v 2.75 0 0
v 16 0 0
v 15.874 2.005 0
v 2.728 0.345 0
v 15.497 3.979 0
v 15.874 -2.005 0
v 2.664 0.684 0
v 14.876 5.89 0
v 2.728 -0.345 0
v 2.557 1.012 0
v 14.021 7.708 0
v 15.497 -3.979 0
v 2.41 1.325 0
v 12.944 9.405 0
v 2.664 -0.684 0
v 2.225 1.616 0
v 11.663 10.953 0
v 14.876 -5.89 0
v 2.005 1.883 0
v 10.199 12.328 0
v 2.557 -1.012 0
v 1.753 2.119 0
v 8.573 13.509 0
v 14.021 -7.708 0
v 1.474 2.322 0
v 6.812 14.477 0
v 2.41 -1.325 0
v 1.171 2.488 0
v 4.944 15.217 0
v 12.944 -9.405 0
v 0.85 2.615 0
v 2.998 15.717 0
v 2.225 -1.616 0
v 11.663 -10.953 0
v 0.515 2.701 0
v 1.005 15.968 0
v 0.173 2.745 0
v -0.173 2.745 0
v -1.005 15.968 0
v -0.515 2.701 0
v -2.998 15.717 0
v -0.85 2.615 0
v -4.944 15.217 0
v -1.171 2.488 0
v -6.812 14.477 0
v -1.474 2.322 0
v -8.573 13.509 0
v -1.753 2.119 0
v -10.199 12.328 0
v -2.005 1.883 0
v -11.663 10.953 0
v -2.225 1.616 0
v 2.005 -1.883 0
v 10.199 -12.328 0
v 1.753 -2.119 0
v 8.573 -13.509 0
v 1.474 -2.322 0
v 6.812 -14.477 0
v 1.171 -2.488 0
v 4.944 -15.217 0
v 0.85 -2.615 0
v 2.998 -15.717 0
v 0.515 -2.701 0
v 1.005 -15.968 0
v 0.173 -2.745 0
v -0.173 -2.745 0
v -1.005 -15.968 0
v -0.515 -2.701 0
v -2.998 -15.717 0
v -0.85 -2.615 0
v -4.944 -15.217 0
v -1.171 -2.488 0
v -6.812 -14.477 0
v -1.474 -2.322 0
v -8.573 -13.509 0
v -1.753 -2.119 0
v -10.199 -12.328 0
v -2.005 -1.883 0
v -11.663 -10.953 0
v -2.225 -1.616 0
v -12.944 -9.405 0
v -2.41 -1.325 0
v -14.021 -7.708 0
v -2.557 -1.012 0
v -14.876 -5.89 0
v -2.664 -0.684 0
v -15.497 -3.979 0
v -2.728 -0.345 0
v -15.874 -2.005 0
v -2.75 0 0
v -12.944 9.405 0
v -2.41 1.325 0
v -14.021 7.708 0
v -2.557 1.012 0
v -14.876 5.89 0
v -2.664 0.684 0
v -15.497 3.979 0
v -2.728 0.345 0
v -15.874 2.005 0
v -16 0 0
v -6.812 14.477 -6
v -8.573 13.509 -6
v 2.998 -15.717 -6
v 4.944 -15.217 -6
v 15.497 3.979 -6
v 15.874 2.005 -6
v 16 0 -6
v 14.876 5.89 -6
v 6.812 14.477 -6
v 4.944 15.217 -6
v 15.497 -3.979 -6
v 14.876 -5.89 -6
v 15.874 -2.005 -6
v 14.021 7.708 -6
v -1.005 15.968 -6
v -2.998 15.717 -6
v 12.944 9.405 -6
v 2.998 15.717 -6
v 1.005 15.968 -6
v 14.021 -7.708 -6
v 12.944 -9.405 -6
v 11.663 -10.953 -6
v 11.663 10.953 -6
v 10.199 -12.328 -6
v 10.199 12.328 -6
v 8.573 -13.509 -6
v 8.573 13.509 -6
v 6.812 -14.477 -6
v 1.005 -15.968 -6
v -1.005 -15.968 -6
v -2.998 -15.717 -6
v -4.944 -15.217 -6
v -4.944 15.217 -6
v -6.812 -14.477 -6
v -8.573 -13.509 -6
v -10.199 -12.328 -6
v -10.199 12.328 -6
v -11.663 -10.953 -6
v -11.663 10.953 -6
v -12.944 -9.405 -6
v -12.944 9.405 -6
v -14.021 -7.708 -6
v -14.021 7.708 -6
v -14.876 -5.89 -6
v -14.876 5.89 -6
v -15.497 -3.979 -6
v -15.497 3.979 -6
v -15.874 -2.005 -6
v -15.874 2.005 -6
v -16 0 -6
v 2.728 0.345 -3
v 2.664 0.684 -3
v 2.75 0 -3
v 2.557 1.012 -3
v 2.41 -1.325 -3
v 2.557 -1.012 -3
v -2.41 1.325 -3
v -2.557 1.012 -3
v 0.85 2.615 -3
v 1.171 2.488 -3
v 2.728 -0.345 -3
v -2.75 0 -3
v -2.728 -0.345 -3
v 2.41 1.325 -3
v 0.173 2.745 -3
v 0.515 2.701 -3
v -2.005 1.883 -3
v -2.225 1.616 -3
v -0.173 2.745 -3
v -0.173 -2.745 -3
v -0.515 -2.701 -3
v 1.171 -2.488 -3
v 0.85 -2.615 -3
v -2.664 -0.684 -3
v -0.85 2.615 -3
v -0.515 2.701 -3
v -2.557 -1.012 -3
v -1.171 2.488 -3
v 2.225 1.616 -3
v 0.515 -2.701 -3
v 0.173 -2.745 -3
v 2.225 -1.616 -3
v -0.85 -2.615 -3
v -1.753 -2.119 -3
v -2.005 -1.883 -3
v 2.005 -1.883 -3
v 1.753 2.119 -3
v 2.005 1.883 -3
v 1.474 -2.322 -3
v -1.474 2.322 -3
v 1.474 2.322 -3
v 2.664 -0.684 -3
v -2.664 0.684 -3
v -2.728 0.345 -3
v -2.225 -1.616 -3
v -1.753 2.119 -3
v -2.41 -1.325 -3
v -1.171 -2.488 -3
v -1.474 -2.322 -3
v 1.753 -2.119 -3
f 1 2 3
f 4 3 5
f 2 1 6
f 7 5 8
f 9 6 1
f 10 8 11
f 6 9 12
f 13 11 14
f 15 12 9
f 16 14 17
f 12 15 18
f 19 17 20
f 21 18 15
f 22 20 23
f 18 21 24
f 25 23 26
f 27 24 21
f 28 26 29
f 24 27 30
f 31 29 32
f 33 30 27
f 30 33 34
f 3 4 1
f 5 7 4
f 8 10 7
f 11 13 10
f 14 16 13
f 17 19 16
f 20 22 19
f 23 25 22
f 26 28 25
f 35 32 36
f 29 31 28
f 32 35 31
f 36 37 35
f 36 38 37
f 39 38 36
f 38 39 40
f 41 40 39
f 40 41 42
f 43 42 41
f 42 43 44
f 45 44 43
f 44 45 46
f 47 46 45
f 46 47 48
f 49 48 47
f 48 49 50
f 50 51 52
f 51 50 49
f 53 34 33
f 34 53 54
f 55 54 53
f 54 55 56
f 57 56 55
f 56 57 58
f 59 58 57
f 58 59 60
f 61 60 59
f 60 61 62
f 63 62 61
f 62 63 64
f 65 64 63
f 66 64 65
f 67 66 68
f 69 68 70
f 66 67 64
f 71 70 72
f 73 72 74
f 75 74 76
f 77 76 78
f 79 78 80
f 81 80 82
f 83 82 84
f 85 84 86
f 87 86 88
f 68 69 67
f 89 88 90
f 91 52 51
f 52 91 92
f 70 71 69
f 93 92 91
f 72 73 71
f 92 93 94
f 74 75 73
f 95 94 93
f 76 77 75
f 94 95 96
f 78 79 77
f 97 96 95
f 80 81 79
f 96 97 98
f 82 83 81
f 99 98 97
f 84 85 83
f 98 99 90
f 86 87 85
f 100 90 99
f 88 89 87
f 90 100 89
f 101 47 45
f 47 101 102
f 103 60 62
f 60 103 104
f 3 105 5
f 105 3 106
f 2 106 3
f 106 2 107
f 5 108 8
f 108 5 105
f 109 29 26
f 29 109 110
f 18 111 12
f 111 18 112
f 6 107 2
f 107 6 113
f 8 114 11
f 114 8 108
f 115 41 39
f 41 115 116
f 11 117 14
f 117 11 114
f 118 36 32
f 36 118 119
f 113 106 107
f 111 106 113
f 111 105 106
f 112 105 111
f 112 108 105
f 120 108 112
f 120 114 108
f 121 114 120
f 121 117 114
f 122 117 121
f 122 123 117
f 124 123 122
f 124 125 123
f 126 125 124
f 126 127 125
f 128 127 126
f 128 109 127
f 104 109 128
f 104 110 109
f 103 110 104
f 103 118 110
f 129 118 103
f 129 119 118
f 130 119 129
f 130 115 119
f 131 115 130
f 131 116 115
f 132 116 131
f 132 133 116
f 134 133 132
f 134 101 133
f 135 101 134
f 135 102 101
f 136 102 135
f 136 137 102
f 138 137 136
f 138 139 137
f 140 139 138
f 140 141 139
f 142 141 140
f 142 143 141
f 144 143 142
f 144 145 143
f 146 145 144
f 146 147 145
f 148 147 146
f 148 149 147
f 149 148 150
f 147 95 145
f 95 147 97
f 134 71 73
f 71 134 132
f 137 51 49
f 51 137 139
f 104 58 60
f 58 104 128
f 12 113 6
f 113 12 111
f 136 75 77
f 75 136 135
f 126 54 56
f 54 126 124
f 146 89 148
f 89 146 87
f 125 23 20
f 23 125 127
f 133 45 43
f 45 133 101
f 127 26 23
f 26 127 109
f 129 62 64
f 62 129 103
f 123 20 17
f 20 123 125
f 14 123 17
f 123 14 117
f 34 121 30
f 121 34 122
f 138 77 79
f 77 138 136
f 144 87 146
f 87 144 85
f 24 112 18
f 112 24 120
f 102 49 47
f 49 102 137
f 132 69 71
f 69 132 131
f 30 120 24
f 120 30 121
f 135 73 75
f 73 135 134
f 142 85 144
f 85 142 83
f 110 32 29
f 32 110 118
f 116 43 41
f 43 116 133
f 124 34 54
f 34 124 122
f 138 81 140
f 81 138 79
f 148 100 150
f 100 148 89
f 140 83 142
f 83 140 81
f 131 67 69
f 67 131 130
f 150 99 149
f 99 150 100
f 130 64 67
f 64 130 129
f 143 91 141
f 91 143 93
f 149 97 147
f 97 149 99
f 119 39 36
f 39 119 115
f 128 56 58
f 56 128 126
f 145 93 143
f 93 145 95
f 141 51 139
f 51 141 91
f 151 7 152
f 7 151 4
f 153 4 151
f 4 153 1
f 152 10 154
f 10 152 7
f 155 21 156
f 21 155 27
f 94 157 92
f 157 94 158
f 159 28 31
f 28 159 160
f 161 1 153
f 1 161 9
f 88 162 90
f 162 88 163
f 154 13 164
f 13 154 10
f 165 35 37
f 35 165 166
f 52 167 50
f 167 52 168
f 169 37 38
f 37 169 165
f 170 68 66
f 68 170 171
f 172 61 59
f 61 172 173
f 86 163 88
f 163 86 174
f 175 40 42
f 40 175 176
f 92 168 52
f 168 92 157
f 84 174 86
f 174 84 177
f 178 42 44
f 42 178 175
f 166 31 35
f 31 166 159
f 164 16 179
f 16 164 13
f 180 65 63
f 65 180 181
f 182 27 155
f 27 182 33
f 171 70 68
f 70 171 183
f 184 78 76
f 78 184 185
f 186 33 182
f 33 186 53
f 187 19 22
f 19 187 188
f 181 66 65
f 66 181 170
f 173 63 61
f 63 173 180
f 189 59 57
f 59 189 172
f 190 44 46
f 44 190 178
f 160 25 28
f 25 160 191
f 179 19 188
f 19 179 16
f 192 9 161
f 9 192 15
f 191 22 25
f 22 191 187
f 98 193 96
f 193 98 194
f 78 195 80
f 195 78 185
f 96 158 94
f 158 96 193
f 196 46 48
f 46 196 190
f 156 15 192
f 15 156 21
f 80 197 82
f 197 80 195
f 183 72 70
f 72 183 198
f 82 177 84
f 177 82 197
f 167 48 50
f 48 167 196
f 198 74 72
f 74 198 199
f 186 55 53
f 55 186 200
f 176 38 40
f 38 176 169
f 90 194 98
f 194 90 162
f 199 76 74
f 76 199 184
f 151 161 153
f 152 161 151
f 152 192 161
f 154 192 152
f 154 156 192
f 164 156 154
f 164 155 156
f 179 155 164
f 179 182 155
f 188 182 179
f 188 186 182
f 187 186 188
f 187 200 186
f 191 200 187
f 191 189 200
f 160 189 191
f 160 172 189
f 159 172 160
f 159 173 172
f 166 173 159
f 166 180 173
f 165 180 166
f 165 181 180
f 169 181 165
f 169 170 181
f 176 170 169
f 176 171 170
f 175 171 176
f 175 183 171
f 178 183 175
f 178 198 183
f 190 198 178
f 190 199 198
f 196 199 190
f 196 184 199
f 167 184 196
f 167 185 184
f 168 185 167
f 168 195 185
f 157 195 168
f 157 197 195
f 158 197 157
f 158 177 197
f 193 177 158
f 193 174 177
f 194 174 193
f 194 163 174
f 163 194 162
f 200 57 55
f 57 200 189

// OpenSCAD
$fn = 50;


difference() {
	union() {
		translate(v = [0, 0, -3.0000000000]) {
			cylinder(h = 3, r = 10.0000000000);
		}
		translate(v = [0, 0, -6.0000000000]) {
			cylinder(h = 6, r = 16.0000000000);
		}
	}
	union() {
		#translate(v = [0, 0, -3]) {
			cylinder(h = 3, r = 2.7500000000);
		}
	}
}
